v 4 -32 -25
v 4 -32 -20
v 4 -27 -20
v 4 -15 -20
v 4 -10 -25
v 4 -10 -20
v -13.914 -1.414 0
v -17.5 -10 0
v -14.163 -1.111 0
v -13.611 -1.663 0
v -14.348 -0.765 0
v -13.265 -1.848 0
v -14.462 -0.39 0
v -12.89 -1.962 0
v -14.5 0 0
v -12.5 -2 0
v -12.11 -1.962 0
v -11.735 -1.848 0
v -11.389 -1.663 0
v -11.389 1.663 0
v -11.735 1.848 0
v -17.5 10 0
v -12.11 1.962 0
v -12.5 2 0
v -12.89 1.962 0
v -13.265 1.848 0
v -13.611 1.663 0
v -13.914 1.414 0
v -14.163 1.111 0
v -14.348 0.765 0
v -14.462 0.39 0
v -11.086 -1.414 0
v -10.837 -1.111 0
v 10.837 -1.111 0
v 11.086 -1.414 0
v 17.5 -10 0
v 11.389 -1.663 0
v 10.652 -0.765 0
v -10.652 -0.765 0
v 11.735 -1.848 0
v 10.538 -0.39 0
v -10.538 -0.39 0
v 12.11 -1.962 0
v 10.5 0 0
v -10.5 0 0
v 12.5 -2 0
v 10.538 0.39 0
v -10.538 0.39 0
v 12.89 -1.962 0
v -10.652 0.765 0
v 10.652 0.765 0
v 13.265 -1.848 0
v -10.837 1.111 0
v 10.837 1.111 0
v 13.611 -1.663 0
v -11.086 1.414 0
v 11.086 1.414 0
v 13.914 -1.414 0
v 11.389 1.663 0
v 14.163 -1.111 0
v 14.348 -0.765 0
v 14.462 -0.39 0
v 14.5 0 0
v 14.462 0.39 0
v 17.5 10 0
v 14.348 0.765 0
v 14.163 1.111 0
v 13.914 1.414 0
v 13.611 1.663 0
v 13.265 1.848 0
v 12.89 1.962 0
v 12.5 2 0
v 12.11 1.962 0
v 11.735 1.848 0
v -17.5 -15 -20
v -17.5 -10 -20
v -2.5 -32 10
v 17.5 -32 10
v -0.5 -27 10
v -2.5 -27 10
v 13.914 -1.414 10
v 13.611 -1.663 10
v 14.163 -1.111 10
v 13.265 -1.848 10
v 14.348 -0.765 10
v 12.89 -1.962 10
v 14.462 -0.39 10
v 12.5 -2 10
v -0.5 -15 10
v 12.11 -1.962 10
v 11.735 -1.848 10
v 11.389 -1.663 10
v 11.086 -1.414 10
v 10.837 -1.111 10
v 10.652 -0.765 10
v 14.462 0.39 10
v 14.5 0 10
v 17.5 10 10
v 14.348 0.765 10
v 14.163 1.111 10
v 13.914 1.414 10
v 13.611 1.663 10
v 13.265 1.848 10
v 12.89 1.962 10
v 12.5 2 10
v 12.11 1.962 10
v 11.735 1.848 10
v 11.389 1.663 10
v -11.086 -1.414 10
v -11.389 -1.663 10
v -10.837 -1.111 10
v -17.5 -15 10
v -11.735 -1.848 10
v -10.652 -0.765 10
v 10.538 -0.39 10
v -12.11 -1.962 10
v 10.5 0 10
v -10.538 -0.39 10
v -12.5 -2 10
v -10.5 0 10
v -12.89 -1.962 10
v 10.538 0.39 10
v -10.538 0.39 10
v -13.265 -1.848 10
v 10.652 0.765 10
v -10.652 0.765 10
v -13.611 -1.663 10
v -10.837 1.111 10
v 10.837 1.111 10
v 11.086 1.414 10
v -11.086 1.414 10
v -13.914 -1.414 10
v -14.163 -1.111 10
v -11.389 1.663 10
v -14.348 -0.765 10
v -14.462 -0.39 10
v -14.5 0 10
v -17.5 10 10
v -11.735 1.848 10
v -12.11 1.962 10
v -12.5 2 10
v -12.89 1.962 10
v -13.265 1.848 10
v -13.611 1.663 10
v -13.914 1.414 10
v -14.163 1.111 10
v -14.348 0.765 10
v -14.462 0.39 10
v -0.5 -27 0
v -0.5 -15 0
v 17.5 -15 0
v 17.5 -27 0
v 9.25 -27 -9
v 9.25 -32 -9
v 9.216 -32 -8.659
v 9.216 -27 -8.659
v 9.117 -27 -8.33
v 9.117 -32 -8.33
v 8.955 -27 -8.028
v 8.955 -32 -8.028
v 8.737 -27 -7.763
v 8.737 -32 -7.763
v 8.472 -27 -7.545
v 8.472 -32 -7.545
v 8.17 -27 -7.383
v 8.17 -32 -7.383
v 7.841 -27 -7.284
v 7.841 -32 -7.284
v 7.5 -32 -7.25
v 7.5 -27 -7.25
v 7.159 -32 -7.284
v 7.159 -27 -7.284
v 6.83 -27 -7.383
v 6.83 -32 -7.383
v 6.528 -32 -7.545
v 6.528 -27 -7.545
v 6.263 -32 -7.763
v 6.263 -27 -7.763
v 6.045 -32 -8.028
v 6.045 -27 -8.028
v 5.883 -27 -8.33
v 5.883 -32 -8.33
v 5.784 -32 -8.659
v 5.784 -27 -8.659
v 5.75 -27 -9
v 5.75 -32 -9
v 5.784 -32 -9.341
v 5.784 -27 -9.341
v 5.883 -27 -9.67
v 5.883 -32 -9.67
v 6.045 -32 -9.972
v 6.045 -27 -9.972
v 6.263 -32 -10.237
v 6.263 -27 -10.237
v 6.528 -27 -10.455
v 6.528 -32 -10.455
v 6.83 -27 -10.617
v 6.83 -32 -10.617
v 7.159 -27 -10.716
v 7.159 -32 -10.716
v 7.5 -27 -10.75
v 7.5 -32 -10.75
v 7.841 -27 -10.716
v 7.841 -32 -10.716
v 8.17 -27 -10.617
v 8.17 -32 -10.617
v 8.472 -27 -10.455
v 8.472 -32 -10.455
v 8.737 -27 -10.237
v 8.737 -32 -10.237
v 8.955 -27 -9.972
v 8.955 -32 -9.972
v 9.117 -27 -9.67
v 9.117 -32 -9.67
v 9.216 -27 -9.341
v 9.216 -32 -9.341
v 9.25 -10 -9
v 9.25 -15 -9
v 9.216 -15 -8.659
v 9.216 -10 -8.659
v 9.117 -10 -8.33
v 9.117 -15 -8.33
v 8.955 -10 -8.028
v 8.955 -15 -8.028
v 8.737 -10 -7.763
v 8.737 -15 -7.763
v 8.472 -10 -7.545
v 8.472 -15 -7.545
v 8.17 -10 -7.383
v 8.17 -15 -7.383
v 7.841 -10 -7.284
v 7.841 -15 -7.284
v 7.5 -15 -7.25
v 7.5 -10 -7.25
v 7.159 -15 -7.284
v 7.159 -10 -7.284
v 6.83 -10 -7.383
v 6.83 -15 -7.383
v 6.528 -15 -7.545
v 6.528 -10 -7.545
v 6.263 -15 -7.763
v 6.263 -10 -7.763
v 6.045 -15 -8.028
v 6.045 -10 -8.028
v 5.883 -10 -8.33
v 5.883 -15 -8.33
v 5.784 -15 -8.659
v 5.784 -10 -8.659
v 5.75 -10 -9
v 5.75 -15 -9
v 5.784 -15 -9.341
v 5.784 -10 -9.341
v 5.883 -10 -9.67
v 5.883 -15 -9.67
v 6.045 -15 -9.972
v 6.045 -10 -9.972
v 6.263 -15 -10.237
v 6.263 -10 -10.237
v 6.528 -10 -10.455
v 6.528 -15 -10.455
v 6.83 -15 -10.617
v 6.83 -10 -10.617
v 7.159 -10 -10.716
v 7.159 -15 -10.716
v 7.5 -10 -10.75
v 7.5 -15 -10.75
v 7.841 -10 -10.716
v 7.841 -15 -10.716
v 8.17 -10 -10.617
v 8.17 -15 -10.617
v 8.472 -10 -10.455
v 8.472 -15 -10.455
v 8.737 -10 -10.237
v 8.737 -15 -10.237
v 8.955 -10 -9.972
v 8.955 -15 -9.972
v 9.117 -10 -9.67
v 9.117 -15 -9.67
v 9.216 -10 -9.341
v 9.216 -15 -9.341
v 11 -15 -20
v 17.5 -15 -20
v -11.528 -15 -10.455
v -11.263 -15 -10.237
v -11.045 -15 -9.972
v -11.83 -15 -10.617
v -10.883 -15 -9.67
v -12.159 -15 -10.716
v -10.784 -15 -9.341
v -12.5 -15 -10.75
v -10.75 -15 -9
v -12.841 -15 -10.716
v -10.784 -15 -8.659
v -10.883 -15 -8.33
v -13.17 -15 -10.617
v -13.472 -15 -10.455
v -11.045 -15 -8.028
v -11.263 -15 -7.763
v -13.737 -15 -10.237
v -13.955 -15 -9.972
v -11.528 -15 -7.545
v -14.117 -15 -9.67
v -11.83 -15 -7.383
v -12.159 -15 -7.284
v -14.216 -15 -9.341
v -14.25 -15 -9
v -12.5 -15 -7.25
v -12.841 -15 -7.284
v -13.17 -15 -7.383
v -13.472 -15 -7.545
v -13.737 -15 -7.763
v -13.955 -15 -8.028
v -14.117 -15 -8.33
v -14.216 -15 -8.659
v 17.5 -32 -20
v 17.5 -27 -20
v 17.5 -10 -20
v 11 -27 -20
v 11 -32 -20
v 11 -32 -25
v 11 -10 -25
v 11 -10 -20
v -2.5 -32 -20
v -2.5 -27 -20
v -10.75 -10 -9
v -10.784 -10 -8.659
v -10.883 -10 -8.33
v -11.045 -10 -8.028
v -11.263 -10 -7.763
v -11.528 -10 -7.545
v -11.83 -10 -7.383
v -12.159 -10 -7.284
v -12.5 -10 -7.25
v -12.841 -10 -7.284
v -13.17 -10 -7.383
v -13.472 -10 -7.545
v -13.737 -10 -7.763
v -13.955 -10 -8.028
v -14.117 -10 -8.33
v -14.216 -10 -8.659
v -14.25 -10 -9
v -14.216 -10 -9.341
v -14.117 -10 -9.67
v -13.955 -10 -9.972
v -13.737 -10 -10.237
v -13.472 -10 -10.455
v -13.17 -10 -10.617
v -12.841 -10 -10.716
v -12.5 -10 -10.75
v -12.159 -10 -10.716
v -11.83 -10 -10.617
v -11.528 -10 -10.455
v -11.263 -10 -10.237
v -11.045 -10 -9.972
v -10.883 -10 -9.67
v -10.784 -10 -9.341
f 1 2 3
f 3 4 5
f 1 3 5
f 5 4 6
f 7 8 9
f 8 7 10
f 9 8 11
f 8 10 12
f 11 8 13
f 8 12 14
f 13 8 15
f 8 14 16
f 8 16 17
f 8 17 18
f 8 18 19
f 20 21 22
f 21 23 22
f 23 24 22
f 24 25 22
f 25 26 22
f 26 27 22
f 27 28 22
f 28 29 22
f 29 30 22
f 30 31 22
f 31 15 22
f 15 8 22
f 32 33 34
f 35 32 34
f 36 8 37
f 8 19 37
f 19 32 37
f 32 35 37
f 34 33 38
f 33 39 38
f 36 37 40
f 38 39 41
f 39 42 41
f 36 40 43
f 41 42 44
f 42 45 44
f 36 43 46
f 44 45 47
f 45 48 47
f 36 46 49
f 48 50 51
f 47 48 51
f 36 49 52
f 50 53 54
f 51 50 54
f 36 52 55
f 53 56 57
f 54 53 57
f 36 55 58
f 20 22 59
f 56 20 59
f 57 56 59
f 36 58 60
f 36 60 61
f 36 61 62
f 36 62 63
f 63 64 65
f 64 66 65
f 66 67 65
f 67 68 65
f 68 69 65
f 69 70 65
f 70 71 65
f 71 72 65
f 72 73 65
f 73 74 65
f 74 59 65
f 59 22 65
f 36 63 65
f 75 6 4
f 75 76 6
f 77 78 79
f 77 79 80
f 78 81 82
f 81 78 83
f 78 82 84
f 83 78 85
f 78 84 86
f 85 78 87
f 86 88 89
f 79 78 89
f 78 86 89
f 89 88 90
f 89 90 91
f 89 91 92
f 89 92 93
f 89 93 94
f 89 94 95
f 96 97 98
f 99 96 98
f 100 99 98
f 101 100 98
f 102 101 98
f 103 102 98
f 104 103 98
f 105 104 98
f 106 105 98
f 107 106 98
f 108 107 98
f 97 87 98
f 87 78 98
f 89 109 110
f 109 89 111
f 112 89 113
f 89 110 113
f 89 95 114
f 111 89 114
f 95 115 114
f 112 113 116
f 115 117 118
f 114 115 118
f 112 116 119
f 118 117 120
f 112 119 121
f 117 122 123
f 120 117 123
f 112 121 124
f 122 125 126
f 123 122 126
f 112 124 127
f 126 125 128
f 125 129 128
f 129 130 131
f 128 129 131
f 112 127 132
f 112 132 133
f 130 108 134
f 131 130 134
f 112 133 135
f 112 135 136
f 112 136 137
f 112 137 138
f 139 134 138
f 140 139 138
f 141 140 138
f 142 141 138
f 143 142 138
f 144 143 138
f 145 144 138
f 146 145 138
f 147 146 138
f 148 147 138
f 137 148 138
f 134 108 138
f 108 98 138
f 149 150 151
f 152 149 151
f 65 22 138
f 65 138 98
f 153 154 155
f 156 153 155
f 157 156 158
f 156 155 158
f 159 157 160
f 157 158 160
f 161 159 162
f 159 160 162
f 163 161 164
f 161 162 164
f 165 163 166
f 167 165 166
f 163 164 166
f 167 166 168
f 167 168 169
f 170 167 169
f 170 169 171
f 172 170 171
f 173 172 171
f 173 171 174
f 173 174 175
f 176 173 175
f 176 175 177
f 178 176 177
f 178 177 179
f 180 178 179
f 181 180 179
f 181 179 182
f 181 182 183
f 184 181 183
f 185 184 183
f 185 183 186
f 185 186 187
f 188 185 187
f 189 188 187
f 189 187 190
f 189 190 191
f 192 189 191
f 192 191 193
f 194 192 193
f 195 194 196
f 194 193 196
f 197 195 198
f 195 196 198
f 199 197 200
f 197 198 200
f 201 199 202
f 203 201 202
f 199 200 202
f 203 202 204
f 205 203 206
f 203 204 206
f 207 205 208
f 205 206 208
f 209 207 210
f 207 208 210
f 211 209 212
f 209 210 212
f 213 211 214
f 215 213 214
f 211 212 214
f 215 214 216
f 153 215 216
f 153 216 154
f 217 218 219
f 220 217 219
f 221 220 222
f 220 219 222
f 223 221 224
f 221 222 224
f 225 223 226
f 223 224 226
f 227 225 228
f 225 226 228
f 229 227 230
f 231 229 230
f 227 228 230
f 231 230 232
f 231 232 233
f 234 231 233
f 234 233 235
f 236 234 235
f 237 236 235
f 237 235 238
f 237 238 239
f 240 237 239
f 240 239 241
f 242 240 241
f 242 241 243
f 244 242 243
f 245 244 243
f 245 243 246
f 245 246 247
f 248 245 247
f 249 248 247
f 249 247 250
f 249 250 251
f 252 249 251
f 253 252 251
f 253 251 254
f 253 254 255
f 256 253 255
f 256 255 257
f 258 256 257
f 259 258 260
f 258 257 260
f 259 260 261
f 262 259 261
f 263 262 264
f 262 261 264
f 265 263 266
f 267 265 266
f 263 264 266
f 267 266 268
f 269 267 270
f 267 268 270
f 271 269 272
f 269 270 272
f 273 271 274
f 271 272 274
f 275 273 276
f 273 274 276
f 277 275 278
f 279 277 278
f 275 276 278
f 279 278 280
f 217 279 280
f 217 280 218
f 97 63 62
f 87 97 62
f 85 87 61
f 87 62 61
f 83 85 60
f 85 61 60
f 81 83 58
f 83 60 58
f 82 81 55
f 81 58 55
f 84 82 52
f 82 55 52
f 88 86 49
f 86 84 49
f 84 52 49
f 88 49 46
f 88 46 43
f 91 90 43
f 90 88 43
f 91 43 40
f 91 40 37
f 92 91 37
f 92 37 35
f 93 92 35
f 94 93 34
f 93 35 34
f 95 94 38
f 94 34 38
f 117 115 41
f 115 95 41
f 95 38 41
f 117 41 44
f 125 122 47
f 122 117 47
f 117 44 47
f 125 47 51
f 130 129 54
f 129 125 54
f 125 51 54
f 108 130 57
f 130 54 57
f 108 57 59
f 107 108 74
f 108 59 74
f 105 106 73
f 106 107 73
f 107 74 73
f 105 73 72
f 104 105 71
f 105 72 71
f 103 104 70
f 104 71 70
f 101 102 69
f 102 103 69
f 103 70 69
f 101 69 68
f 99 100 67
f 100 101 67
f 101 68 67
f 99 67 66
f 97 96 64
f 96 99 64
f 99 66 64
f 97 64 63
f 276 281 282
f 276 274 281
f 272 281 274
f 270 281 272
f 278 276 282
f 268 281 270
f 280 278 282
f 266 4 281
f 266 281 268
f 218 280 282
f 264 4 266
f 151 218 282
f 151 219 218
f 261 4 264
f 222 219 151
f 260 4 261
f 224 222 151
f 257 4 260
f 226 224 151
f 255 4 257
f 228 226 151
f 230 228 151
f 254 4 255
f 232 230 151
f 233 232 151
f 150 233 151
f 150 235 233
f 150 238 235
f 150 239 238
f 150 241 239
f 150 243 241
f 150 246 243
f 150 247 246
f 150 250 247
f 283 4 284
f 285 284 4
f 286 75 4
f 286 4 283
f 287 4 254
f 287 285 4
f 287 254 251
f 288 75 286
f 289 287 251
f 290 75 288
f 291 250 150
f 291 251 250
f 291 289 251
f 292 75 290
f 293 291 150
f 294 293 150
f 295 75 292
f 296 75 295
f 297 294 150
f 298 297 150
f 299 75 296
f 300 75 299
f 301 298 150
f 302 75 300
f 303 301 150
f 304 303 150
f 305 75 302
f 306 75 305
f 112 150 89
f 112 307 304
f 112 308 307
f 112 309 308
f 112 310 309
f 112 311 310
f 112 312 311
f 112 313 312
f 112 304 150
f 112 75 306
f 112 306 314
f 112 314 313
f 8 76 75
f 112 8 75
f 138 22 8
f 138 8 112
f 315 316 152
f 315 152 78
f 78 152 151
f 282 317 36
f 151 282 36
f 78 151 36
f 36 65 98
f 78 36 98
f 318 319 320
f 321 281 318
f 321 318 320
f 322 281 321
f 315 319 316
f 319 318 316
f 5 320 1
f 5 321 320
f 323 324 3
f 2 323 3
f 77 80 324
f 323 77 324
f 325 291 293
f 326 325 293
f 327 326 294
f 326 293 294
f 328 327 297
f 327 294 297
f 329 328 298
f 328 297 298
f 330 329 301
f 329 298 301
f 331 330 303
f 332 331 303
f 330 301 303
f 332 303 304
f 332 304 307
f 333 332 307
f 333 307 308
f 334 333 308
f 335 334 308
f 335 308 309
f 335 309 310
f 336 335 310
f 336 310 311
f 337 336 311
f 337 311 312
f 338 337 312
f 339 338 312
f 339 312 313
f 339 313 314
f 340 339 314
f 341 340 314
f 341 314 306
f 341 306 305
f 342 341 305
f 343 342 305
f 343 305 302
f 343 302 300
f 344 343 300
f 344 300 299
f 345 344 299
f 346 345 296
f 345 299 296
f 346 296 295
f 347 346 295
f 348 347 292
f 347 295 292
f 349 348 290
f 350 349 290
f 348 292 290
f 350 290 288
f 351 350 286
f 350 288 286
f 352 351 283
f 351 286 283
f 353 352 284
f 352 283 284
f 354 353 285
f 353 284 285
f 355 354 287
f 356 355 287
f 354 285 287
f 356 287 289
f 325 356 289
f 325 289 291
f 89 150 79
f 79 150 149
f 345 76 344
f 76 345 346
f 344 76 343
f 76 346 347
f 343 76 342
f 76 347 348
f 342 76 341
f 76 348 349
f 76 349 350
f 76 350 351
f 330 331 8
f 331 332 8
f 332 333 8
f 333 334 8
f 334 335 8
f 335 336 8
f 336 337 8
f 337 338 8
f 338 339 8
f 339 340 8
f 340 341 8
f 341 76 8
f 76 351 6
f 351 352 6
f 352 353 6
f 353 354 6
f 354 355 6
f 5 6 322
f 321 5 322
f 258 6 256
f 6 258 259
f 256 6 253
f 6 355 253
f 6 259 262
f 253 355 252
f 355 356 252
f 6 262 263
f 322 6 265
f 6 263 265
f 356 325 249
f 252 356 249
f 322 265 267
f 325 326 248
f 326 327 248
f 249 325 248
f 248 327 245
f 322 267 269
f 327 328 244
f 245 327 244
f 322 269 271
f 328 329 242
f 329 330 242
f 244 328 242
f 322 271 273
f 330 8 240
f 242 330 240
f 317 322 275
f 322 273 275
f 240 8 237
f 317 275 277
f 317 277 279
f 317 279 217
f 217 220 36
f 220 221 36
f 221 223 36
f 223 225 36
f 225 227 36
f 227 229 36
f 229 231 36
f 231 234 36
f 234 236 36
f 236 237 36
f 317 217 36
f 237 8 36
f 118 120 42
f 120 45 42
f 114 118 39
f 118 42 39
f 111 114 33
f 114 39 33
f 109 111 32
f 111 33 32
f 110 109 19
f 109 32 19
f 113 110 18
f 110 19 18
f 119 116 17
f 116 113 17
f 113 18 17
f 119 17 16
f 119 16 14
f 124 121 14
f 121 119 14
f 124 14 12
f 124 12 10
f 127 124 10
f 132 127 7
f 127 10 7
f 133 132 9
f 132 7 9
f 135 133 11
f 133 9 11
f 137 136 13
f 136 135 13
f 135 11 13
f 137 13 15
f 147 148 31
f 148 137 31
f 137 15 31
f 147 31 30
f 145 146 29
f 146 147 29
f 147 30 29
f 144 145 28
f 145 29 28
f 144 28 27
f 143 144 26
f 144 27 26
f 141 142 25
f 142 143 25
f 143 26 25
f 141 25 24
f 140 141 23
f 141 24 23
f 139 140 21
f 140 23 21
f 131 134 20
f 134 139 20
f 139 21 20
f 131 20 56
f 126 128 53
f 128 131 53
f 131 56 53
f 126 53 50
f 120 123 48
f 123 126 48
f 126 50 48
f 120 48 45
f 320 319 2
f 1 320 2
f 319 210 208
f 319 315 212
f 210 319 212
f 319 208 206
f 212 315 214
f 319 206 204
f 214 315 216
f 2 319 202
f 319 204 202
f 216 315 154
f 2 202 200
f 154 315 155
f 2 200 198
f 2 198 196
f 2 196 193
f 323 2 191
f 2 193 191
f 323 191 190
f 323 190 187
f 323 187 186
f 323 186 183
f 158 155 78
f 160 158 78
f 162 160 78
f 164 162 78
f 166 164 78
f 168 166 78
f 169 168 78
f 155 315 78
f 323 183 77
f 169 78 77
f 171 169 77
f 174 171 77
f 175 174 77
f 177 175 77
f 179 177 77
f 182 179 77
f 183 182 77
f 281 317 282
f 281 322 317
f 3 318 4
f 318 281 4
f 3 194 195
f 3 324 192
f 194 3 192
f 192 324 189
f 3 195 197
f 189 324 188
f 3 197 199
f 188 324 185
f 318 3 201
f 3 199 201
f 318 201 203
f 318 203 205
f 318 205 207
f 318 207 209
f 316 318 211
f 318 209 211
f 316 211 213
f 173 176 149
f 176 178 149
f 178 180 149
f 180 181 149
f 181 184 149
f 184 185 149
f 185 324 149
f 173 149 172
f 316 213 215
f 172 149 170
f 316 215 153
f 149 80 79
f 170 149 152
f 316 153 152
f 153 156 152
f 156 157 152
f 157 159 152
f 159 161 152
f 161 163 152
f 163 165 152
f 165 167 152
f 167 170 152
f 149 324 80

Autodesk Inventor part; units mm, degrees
ref_plane "YZ Plane" through (0, 0, 0) normal (1, 0, 0) x (0, 1, 0)
ref_plane "XZ Plane" through (0, 0, 0) normal (0, 1, 0) x (-1, 0, 0)
ref_plane "XY Plane" through (0, 0, 0) normal (0, 0, 1) x (1, 0, 0)
sketch "Boceto1" plane through (0, 0, 0) normal (0, 0, 1) x (1, 0, 0)
  line L0 (-17.5, 10) -> (17.5, 10)
  line L1 (17.5, 10) -> (17.5, -10)
  line L2 (17.5, -10) -> (-17.5, -10)
  line L3 (-17.5, -10) -> (-17.5, 10)
  line L4 (0, 0) -> (0, 1.7227)
  line L5 (0, 0) -> (-2.1619, 0)
  line L6 (17.5, -10) -> (-0.5, -10)
  line L7 (-0.5, -10) -> (-0.5, -27)
  line L8 (-0.5, -27) -> (17.5, -27)
  line L9 (17.5, -27) -> (17.5, -10)
  circle A0 centre (12.5, 0) radius 2
  circle A1 centre (-12.5, 0) radius 2
  point P0 (-0.5, -10)
  dimension "d14" = 35
  dimension "d15" = 20
  dimension "d16" = 18
  dimension "d17" = 17
  dimension "d18" = 4
  dimension "d19" = 4
  dimension "d20" = 5
  dimension "d21" = 5
extrude "Extrusión1" add sketch "Boceto1" along normal blind 10
sketch "Boceto2" plane through (-0.5, -27, 0) normal (0, -1, 0) x (1, 0, 0)
  line L0 (18, 10) -> (-17, 10) projected
  line L1 (18, 10) -> (-2, 10)
  line L2 (-2, 10) -> (-2, -20)
  line L3 (-2, -20) -> (18, -20)
  line L4 (18, -20) -> (18, 10)
  point P0 (0.5, 0)
  point P1 (-2, 10)
  dimension "d22" = 30
  dimension "d53" = 20
extrude "Extrusión2" add sketch "Boceto2" along normal blind 5
sketch "Boceto4" plane through (-17.5, -10, 0) normal (-1, 0, 0) x (0, 0, 1)
  line L0 (0, 0) -> (0, -17) projected
  line L1 (10, 20) -> (10, 0) projected
  line L2 (10, 0) -> (-20, 0)
  line L3 (-20, 0) -> (-20, -5)
  line L4 (-20, -5) -> (10, -5)
  line L5 (10, -5) -> (10, 0)
  line L6 (10, -22) -> (-20, -22) projected
  point P0 (0, 10)
  dimension "d32" = 5
  dimension "d43" = 30
  dimension "d44" = 30
extrude "Extrusión4" add sketch "Boceto4" against normal up to surface (35 mm away)
sketch "Boceto5" plane through (-0.5, -32, 0) normal (0, -1, 0) x (1, 0, 0)
  circle A0 centre (8, -9) radius 1.75
  line L0 (18, -20) -> (18, 10) projected
  circle A1 centre (-12, -9) radius 1.75
  line L1 (-2, -20) -> (18, -20) projected
  line L2 (-17, -20) -> (18, -20) projected
  line L3 (-17, -20) -> (-17, 10) projected
  line L4 (-17, 0) -> (18, 0) projected
  point P0 (0.5, 0)
  point P1 (0, 0)
  dimension "d33" = 3.5
  dimension "d34" = 10
  dimension "d37" = 3.5
  dimension "d38" = 5
  dimension "d41" = 9
  dimension "d42" = 9
extrude "Extrusión5" cut sketch "Boceto5" against normal up to surface (22 mm away) contours A0 | A1
sketch "Boceto7" plane through (17.5, -27, -20) normal (0, 0, -1) x (-1, 0, 0)
  line L0 (0, -5) -> (20, -5) projected
  line L1 (35, 17) -> (0, 17) projected
  line L2 (10, -5) -> (10, -5.3641)
  line L3 (13.5, -5) -> (13.5, 17)
  line L4 (6.5, -5) -> (6.5, 17)
  point P0 (17.5, 27)
  dimension "d47" = 7
extrude "Extrusión7" add sketch "Boceto7" along normal blind 5
equation "\"d19\" = d18"
equation "\"d20\" = d21"
equation "\"d44\" = d43"
equation "\"d37\" = d33"
properties part number "Soporte Idler Z" material "Hormigón reforzado con fibra de vidrio"
